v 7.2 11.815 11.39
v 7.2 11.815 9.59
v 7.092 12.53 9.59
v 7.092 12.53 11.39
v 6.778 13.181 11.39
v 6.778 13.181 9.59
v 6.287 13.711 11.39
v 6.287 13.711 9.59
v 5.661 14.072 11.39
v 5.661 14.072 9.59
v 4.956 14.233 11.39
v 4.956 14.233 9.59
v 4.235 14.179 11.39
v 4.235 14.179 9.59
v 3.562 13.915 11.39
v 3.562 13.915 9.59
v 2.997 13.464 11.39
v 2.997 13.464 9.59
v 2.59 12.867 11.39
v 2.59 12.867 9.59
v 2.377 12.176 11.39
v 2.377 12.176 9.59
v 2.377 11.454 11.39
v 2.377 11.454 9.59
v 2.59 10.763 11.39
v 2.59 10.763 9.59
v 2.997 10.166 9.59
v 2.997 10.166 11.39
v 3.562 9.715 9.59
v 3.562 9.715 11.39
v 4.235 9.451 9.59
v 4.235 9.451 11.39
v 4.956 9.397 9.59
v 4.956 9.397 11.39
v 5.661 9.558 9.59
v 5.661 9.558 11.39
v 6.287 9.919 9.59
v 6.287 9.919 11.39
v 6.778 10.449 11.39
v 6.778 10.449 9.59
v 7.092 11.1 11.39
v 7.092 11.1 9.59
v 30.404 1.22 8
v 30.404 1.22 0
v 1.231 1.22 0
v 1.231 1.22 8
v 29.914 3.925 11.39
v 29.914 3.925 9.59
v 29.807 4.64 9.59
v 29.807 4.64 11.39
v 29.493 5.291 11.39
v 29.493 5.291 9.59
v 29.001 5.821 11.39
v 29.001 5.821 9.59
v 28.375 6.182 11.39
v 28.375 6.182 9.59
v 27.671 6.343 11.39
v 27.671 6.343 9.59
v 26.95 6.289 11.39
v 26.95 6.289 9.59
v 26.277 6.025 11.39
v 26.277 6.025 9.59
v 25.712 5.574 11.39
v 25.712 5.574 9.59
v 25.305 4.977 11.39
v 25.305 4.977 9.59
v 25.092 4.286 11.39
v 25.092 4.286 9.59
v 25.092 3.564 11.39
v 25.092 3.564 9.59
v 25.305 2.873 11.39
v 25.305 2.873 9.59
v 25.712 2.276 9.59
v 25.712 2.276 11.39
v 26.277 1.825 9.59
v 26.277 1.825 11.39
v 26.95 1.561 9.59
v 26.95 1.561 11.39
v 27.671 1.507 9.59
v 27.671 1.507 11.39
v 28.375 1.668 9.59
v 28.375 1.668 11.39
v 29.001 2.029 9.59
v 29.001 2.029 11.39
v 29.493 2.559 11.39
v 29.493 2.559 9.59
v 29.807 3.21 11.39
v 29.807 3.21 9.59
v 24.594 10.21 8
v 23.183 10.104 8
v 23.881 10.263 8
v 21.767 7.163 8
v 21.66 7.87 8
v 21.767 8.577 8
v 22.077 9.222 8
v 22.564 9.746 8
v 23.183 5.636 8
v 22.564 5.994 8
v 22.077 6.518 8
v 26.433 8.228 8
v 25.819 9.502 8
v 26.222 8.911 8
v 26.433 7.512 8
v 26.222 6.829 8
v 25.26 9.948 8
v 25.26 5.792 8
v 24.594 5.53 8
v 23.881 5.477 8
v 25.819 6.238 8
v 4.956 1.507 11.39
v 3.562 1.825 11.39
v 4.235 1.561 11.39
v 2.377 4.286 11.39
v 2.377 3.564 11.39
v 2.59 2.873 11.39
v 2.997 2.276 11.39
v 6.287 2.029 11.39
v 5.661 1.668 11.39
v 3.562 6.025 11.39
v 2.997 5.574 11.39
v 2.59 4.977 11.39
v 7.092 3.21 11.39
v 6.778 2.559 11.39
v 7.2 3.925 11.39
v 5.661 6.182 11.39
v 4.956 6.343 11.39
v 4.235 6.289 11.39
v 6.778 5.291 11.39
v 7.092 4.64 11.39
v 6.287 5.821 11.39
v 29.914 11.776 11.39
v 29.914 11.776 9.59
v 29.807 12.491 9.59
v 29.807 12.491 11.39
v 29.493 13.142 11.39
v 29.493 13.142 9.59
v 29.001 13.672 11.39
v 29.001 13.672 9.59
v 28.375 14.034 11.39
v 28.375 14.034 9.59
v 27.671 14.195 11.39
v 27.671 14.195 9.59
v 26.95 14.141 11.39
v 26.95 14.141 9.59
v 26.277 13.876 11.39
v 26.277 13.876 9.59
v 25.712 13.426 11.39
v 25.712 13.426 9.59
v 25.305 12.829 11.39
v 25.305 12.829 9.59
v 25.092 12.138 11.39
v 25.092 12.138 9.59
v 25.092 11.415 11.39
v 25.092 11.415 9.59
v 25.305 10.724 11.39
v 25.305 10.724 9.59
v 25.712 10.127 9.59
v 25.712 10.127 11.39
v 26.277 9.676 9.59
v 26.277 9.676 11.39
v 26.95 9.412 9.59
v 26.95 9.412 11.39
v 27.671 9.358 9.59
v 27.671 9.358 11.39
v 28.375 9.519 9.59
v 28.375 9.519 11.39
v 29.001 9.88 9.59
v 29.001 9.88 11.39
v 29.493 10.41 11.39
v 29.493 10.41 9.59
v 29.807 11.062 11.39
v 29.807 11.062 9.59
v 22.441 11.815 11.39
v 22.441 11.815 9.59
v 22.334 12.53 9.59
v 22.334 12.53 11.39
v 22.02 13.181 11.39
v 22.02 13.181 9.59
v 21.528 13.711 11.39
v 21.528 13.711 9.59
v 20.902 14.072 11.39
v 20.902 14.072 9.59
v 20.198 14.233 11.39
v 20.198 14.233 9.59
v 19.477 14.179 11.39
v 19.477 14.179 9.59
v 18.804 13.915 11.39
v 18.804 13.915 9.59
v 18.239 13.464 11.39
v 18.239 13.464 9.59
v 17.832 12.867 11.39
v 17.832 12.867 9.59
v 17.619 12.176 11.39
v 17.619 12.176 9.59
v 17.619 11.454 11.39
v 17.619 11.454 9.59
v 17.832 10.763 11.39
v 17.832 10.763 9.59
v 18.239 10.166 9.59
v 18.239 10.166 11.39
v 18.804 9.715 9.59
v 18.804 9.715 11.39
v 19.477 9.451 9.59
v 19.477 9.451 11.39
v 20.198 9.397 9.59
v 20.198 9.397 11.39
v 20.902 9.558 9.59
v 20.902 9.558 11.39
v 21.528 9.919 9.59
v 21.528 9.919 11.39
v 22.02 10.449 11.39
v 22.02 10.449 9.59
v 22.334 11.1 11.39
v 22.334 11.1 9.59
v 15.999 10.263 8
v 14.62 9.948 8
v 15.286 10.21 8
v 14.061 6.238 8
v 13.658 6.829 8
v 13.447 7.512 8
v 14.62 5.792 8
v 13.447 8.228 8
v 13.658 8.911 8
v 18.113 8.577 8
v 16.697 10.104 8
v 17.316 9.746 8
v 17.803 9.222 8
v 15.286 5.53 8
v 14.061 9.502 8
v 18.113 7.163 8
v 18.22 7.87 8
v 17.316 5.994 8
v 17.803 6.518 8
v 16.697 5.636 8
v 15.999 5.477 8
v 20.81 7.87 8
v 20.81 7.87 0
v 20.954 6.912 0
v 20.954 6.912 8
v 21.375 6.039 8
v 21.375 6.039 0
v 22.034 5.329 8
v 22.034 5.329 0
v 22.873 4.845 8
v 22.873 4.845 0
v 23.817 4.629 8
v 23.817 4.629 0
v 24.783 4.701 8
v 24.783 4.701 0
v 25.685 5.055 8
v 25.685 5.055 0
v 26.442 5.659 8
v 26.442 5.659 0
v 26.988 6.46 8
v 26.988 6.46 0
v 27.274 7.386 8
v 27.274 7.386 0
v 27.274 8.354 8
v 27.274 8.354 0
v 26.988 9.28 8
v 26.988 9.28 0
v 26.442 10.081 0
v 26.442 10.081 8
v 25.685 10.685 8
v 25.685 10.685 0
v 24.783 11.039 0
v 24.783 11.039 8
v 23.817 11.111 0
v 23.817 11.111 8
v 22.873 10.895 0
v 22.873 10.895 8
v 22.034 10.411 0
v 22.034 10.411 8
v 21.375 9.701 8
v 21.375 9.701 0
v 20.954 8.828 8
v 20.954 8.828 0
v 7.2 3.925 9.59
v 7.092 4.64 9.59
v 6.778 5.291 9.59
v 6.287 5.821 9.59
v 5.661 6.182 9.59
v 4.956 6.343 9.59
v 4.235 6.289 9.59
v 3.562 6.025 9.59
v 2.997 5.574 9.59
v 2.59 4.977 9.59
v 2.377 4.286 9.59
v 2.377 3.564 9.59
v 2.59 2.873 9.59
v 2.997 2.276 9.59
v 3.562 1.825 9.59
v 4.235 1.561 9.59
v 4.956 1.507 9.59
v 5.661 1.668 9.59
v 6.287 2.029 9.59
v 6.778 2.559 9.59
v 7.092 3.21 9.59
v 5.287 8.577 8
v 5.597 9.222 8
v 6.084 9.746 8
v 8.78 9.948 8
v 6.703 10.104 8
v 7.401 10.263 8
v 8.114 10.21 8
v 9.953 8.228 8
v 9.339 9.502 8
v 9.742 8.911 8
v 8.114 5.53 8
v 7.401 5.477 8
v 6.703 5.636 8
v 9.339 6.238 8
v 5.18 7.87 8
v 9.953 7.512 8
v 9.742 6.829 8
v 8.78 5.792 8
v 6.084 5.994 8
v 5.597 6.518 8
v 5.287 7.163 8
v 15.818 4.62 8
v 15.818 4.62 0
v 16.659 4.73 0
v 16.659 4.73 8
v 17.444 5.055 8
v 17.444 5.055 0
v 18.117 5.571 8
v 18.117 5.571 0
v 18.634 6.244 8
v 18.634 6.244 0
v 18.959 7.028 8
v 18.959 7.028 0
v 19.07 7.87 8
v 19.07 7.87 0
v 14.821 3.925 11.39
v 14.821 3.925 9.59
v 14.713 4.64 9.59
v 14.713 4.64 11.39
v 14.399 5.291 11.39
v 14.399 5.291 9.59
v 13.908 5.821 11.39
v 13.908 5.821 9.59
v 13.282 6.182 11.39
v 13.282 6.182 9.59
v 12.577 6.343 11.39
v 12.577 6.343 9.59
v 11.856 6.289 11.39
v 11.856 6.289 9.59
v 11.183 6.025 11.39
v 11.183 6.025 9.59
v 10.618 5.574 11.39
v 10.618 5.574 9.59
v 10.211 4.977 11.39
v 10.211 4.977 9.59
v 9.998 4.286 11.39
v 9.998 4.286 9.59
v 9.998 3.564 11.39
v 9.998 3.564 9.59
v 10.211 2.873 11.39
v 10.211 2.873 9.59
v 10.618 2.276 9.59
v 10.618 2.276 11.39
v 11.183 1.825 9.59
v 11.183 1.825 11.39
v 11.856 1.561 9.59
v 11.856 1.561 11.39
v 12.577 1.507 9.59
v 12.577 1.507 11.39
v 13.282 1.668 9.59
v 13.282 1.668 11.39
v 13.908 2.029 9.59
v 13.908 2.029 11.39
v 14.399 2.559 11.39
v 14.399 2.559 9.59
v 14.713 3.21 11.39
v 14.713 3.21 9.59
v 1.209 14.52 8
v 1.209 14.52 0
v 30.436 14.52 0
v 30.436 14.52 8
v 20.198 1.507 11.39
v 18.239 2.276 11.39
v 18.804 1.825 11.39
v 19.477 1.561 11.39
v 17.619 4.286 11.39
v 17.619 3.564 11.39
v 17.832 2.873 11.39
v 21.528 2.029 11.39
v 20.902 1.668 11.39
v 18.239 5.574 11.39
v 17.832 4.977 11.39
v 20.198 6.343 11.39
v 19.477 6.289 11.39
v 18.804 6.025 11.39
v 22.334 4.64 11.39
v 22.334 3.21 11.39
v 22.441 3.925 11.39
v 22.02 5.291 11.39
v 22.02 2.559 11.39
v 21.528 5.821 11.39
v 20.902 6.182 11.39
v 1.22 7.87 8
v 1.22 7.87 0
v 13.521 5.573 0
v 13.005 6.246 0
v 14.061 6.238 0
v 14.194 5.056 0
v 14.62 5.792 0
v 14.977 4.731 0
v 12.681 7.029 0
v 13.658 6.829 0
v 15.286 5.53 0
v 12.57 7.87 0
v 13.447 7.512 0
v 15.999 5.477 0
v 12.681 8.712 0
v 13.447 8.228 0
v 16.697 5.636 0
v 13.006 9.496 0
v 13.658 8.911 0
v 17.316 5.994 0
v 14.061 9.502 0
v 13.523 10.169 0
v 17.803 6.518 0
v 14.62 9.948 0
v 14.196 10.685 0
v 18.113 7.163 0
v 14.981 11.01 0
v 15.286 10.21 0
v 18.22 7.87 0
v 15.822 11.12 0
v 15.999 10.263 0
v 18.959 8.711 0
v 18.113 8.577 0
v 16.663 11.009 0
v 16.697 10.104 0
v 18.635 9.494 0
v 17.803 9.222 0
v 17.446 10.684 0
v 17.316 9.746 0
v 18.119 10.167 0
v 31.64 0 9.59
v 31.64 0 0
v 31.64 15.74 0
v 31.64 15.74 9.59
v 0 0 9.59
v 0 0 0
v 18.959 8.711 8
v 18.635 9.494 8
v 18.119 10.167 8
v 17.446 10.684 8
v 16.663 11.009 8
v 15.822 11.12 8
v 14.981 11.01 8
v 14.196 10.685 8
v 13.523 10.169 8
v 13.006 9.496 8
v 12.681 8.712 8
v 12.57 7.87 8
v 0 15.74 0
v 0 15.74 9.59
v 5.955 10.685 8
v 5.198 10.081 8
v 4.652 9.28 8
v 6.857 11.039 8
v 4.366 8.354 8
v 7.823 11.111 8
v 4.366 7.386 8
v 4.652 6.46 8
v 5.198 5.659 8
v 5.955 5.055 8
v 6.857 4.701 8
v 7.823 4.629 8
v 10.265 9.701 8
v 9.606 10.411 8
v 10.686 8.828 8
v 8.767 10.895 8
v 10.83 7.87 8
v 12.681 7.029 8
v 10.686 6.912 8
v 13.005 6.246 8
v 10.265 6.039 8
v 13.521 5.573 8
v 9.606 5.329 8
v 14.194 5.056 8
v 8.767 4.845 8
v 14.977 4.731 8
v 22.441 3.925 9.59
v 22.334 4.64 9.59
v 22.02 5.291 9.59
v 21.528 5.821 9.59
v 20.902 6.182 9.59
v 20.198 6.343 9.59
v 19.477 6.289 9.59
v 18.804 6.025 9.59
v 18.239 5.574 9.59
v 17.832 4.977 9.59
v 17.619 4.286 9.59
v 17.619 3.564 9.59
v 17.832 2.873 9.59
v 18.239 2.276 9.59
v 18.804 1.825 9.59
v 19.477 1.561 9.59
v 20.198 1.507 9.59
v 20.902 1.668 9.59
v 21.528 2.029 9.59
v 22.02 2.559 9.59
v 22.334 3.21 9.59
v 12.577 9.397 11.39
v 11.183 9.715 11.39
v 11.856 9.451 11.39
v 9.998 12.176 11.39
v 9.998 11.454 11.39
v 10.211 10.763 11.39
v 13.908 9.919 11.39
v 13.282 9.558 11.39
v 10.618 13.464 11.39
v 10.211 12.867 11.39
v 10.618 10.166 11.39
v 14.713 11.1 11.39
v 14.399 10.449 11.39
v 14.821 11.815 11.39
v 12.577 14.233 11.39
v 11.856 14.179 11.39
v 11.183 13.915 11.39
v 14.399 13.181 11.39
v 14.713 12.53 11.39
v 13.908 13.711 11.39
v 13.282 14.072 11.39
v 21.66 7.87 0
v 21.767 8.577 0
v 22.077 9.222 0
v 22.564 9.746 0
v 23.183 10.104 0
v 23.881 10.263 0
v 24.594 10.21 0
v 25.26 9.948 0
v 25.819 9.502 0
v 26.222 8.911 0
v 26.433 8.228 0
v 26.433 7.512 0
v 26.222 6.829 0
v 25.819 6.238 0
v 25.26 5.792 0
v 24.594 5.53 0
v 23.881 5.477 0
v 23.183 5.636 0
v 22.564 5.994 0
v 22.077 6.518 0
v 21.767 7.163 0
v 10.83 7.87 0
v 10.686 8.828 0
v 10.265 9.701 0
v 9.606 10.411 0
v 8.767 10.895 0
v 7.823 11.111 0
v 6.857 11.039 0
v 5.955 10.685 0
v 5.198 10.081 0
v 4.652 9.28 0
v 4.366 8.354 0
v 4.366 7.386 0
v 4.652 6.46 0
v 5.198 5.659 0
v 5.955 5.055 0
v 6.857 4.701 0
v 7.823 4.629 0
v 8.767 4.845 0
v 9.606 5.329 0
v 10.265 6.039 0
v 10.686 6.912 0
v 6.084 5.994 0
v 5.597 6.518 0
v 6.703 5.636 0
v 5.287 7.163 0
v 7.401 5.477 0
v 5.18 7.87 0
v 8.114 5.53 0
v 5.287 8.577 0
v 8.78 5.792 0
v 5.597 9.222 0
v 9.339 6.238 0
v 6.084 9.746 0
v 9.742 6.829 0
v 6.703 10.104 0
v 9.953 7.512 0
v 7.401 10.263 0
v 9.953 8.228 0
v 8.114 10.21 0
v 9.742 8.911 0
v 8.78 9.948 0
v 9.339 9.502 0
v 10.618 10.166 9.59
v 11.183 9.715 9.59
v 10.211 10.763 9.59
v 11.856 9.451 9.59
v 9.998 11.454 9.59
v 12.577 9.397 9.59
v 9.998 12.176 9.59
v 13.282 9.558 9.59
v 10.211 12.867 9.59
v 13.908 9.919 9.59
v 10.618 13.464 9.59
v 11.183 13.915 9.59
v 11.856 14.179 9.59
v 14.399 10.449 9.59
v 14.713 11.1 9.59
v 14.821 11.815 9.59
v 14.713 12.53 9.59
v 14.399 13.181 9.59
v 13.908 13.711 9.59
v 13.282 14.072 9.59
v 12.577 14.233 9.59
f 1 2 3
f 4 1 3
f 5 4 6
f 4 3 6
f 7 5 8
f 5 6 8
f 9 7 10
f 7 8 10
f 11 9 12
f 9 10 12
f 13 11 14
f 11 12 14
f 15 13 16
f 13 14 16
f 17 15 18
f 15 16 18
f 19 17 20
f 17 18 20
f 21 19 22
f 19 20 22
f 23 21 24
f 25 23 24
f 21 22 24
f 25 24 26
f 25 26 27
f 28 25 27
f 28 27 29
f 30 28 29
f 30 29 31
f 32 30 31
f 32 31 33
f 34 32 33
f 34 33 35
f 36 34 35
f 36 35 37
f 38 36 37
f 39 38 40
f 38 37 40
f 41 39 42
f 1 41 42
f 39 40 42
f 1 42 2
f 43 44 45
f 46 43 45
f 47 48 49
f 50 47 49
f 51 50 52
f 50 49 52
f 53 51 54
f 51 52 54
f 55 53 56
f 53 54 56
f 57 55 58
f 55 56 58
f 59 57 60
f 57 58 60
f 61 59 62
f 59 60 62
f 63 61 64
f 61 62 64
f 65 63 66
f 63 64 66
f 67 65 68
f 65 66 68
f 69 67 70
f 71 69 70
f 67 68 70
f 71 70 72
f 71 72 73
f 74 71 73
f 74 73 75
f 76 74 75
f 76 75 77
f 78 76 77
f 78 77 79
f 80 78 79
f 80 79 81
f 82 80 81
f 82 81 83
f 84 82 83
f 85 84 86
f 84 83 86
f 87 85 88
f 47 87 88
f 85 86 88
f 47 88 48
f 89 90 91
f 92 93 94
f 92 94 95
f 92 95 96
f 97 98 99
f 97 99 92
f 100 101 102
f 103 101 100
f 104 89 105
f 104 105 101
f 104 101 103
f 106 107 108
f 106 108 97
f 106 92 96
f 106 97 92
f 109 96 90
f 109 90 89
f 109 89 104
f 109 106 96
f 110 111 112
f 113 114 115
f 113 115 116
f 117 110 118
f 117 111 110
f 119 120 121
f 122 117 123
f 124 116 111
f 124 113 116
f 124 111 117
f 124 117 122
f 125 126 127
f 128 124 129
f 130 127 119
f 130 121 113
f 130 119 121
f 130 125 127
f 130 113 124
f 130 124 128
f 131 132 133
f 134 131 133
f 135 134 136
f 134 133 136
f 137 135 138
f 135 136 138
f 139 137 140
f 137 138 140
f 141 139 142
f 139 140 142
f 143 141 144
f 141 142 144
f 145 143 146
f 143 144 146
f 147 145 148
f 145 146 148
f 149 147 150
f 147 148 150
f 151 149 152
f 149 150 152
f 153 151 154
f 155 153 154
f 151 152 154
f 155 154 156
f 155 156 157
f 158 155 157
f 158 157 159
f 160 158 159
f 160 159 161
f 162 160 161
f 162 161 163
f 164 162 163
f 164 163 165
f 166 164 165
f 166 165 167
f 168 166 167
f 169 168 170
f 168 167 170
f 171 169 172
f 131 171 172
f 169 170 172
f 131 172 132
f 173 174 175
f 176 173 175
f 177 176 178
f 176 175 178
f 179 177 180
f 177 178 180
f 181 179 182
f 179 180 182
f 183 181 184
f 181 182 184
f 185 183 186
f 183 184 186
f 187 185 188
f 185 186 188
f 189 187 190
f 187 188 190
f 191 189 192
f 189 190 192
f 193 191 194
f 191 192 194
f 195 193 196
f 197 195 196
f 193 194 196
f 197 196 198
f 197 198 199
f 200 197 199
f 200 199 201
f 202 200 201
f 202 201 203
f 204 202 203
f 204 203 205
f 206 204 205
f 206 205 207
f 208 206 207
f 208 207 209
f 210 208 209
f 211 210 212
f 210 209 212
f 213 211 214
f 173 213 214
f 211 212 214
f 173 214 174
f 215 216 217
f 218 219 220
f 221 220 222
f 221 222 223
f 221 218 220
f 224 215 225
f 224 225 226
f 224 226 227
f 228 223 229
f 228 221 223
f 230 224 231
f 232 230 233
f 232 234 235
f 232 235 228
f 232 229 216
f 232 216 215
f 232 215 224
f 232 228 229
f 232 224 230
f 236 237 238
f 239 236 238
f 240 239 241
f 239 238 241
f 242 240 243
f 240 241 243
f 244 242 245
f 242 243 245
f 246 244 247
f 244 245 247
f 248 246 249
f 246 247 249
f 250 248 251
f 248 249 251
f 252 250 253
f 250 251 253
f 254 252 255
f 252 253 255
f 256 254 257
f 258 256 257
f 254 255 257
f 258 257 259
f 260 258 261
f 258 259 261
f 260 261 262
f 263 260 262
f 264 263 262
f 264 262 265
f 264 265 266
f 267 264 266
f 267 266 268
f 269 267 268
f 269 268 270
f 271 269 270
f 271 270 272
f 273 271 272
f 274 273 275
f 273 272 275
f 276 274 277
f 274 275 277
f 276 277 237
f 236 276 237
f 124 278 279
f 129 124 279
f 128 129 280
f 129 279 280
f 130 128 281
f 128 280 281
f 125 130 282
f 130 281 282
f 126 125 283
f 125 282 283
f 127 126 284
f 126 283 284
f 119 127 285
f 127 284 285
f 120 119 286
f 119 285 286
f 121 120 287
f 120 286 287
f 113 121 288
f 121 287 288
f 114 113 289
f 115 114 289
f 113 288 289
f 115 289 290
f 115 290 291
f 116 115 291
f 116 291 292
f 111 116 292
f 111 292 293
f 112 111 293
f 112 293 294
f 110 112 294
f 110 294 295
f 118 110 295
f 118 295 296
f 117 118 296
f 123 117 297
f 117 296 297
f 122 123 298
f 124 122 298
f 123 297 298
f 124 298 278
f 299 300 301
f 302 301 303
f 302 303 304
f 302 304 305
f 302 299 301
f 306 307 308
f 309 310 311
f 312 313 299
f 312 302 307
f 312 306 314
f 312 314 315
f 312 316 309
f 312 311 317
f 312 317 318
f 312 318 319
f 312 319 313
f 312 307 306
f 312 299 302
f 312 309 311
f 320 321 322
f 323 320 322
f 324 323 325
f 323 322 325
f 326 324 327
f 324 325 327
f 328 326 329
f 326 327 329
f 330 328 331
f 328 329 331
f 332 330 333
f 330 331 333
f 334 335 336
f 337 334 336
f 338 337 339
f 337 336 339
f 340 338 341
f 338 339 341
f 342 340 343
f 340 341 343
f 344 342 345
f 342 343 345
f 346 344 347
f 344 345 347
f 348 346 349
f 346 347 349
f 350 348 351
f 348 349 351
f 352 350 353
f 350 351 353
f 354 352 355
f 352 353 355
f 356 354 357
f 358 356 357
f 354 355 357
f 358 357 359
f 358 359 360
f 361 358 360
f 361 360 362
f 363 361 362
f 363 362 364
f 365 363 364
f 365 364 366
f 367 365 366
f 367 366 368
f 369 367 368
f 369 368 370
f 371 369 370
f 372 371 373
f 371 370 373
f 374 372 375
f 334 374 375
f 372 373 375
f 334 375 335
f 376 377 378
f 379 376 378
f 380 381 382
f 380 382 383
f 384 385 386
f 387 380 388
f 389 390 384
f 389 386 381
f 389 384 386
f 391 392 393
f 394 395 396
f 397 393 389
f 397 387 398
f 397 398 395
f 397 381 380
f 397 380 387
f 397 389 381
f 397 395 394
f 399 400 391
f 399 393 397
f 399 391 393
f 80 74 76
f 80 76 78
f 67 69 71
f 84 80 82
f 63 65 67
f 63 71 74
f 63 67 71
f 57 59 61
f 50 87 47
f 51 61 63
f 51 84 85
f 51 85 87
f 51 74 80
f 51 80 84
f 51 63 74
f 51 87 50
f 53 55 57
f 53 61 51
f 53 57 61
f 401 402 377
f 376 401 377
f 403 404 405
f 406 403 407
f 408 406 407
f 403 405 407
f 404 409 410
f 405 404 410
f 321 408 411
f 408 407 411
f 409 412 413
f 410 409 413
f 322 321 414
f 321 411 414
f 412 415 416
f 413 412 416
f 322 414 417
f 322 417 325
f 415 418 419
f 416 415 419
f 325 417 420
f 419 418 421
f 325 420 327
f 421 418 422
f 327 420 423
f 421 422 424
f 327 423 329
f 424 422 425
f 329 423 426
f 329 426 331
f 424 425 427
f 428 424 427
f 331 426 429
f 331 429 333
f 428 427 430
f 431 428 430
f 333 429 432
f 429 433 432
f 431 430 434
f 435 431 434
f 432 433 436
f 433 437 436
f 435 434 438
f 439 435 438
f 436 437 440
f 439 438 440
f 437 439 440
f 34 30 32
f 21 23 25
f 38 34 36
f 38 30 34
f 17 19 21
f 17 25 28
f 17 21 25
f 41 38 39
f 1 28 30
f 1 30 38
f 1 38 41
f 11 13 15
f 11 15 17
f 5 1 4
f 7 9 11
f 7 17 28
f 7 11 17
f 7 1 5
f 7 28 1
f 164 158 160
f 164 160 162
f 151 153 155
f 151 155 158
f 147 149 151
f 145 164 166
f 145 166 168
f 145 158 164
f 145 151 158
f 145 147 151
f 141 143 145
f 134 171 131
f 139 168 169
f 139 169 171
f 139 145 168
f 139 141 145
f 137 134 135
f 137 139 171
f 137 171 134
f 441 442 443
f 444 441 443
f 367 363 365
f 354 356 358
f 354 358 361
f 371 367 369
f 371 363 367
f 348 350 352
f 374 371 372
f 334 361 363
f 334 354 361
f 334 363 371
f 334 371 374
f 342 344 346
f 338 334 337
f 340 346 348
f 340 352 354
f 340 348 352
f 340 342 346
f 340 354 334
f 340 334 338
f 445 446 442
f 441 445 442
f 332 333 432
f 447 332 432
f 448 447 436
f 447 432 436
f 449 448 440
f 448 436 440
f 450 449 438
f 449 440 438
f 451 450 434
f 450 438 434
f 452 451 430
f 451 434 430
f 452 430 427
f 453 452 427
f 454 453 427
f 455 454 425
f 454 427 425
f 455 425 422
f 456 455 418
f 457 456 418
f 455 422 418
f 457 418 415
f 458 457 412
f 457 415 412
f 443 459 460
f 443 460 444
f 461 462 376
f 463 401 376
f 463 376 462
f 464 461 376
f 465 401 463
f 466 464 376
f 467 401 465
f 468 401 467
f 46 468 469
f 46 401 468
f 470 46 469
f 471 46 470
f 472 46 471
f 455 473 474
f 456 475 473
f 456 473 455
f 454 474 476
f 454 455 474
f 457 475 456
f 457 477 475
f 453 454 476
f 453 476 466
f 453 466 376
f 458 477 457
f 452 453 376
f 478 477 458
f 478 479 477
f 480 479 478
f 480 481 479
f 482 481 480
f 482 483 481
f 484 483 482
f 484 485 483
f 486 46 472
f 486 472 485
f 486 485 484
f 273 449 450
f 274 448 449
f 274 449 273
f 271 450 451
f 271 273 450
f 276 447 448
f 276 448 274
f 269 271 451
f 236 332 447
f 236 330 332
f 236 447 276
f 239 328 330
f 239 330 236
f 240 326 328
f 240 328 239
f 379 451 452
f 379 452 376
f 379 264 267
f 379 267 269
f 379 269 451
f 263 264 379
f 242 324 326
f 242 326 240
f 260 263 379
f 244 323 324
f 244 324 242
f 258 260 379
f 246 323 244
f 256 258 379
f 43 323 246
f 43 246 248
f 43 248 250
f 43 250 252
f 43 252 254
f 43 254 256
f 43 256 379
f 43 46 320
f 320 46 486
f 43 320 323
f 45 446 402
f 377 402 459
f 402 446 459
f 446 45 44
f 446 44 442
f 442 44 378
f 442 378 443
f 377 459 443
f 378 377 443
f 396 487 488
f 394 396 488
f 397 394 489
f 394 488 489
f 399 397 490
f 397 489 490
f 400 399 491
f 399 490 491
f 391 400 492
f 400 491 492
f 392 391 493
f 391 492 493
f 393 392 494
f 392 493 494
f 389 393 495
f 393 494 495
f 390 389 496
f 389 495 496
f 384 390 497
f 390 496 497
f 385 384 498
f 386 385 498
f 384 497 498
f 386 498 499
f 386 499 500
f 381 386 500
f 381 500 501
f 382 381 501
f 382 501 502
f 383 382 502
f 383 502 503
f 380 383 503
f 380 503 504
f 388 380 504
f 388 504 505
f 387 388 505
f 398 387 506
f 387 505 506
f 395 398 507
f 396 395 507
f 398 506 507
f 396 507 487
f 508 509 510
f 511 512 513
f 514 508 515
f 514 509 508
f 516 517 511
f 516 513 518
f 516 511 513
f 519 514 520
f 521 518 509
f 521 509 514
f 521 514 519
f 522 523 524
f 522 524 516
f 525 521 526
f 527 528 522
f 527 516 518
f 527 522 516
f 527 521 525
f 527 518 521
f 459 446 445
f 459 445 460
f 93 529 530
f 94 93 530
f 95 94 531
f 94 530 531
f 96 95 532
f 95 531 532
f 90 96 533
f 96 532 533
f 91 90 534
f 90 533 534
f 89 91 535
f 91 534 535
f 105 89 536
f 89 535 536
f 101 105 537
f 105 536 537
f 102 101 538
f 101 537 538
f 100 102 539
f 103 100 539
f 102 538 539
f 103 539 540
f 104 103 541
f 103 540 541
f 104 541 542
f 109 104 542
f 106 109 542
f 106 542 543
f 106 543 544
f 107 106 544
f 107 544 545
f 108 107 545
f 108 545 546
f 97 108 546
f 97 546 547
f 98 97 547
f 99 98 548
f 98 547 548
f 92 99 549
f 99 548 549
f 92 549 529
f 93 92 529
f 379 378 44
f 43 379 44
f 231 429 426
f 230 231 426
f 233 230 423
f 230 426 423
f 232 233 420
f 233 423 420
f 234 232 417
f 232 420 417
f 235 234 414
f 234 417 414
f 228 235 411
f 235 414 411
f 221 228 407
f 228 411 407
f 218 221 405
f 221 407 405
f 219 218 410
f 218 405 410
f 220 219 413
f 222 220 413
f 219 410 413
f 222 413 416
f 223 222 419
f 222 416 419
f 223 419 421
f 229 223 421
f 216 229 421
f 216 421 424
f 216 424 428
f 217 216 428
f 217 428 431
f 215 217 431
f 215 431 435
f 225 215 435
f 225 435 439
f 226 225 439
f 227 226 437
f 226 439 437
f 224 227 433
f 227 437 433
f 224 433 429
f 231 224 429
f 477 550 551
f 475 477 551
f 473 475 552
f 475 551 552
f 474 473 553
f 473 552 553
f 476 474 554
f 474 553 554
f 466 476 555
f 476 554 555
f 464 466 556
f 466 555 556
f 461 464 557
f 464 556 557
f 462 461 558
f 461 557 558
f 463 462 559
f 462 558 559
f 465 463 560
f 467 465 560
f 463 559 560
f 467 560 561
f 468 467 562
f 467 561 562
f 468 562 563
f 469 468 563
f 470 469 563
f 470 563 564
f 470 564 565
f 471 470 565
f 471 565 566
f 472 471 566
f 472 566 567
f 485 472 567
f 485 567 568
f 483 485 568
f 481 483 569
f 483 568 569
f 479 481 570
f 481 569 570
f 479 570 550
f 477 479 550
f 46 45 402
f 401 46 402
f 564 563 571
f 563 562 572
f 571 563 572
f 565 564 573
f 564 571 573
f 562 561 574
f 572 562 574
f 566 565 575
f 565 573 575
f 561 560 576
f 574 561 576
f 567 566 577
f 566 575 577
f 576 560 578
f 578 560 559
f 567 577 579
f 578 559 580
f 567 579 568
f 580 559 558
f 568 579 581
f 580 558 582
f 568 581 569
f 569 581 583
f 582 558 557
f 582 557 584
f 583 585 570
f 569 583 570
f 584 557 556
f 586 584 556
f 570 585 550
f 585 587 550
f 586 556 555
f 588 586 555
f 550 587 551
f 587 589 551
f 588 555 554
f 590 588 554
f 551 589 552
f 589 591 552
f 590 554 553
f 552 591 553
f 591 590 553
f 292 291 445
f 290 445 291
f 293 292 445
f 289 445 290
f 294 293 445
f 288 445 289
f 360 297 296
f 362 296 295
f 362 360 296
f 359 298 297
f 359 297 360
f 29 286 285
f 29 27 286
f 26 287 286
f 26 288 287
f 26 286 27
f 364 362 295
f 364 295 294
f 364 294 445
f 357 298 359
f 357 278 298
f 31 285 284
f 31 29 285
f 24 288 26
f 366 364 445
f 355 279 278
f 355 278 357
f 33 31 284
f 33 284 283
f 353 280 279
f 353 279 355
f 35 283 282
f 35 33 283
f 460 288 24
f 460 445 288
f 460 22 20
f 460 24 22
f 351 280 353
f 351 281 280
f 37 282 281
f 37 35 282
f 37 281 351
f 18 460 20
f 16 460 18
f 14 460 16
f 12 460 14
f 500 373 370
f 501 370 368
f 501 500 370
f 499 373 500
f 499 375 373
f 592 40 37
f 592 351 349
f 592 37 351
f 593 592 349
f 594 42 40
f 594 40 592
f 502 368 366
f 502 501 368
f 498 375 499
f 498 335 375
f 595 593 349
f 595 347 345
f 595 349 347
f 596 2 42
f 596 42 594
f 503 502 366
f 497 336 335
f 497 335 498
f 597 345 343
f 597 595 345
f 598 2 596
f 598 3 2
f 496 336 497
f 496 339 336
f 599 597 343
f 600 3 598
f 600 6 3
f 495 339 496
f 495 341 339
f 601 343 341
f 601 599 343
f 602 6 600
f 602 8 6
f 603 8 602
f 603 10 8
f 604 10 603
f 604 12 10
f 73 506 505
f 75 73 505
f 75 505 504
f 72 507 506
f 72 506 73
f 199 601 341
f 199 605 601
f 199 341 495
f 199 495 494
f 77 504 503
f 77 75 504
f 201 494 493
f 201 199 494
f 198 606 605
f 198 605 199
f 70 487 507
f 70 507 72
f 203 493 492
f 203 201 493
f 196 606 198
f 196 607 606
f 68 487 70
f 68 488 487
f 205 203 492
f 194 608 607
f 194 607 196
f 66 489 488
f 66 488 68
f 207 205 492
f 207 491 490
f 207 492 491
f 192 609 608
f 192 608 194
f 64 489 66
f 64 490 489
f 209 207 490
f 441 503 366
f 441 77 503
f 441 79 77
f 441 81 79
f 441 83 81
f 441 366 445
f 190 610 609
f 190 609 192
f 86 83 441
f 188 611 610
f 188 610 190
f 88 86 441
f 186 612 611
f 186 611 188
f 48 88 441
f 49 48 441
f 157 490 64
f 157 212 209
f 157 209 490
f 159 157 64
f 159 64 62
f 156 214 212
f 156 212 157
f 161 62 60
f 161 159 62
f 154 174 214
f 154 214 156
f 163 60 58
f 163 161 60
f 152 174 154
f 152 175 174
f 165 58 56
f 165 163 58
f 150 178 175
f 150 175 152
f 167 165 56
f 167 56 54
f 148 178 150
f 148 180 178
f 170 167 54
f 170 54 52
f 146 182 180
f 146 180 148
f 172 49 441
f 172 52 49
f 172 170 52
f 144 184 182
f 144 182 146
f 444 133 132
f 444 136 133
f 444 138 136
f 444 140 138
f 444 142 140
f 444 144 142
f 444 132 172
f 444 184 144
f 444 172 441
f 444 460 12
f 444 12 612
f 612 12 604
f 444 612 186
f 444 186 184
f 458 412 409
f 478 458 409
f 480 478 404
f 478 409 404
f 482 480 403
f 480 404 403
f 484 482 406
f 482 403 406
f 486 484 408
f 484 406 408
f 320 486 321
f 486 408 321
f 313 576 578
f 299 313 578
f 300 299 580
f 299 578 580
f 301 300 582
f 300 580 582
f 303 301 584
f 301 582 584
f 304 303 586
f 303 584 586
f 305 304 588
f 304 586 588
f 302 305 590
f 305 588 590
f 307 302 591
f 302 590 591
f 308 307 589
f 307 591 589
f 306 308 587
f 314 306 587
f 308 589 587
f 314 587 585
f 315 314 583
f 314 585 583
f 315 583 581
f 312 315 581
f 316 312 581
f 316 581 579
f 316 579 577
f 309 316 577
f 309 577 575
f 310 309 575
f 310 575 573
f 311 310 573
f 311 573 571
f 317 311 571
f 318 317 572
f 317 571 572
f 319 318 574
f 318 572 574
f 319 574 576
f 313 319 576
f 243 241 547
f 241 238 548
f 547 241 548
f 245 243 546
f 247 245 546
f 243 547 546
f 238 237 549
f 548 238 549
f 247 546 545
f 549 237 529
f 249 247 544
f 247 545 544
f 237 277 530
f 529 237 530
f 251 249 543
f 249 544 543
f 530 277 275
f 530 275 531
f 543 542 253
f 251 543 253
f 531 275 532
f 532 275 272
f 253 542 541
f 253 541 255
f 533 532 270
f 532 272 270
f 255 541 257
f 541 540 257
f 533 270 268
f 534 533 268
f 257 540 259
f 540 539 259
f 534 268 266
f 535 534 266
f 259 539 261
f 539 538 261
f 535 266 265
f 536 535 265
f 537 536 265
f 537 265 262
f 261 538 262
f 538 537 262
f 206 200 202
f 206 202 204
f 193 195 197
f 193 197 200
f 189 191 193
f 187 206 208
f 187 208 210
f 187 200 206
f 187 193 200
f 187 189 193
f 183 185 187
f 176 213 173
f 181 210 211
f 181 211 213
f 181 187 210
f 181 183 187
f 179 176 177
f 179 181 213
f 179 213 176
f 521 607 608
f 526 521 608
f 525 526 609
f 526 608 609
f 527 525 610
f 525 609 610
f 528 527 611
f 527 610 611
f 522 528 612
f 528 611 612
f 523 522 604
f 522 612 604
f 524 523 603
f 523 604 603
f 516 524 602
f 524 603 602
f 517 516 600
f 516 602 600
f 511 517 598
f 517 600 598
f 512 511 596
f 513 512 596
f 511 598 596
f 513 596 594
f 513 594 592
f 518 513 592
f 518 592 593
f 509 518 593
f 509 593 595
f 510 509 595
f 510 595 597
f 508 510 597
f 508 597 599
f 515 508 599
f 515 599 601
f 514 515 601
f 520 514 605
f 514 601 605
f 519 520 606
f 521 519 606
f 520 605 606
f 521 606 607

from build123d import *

# Parameters (mm, degrees)
F0_W     = 31.64
F0_H     = 15.74
F1_DEPTH = 9.59
F2_R     = 2.425
F3_DEPTH = 1.8
F5_DEPTH = 8


with BuildPart() as f1:
    # F0 (on Top) → F1 (new body)
    with BuildSketch(Plane.XY):
        with Locations((15.82, 7.87)):
            Rectangle(F0_W, F0_H)
    extrude(amount=F1_DEPTH)

    # F2 (on face) → F3 (join)
    with BuildSketch(Plane.XY.offset(9.59)):
        with Locations((4.7746349379, 11.815)):
            Circle(F2_R)
        with Locations((12.3955499551, 11.815)):
            Circle(F2_R)
        with Locations((20.0164649723, 11.815)):
            Circle(F2_R)
        with Locations((27.4894218309, 11.7763556091)):
            Circle(F2_R)
        with Locations((4.7746349379, 3.925)):
            Circle(F2_R)
        with Locations((12.3955499551, 3.925)):
            Circle(F2_R)
        with Locations((20.0164649723, 3.925)):
            Circle(F2_R)
        with Locations((27.4894218309, 3.925)):
            Circle(F2_R)
    extrude(amount=F3_DEPTH)

    # F4 (on face) → F5 (cut)
    with BuildSketch(Plane(origin=(0, 0, 0), x_dir=(1, 0, 0), z_dir=(0, 0, -1))):
        with BuildLine():
            ThreePointArc((19.07, -7.87), (18.1189275762, -10.1672662012), (15.8223495388, -11.1199991507))
            Line((15.8223495388, -11.1199991507), (15.8223495388, -14.52))
            Line((15.8223495388, -14.52), (30.4358961851, -14.52))
            Line((30.4358961851, -14.52), (30.4199965129, -7.87))
            Line((30.4199965129, -7.87), (27.31, -7.87))
            ThreePointArc((27.31, -7.87), (24.06, -11.12), (20.81, -7.87))
            Line((20.81, -7.87), (19.07, -7.87))
        make_face()
        with BuildLine():
            Line((15.817648704, -1.22), (15.817648704, -4.6200008506))
            ThreePointArc((15.817648704, -4.6200008506), (18.1172655798, -5.5710718028), (19.07, -7.87))
            Line((19.07, -7.87), (20.81, -7.87))
            ThreePointArc((20.81, -7.87), (24.06, -4.62), (27.31, -7.87))
            Line((27.31, -7.87), (30.4199965129, -7.87))
            Line((30.4199965129, -7.87), (30.4040968407, -1.22))
            Line((30.4040968407, -1.22), (15.817648704, -1.22))
        make_face()
        with BuildLine():
            ThreePointArc((4.33, -7.87), (7.58, -4.62), (10.83, -7.87))
            Line((10.83, -7.87), (12.57, -7.87))
            ThreePointArc((12.57, -7.87), (13.5210718028, -5.5727344202), (15.817648704, -4.6200008506))
            Line((15.817648704, -4.6200008506), (15.817648704, -1.22))
            Line((15.817648704, -1.22), (1.2312005673, -1.22))
            Line((1.2312005673, -1.22), (1.2200017299, -7.87))
            Line((1.2200017299, -7.87), (4.33, -7.87))
        make_face()
        with BuildLine():
            Line((12.57, -7.87), (10.83, -7.87))
            ThreePointArc((10.83, -7.87), (7.58, -11.12), (4.33, -7.87))
            Line((4.33, -7.87), (1.2200017299, -7.87))
            Line((1.2200017299, -7.87), (1.2088028926, -14.52))
            Line((1.2088028926, -14.52), (15.8223495388, -14.52))
            Line((15.8223495388, -14.52), (15.8223495388, -11.1199991507))
            ThreePointArc((15.8223495388, -11.1199991507), (13.5227337988, -10.1689275762), (12.57, -7.87))
        make_face()
        with BuildLine():
            Line((5.18, -7.87), (9.98, -7.87))
            ThreePointArc((9.98, -7.87), (7.58, -5.47), (5.18, -7.87))
        make_face()
        with BuildLine():
            ThreePointArc((5.18, -7.87), (7.58, -10.27), (9.98, -7.87))
            Line((9.98, -7.87), (5.18, -7.87))
        make_face()
        with BuildLine():
            Line((18.22, -7.87), (13.42, -7.87))
            ThreePointArc((13.42, -7.87), (15.82, -10.27), (18.22, -7.87))
        make_face()
        with BuildLine():
            ThreePointArc((18.22, -7.87), (15.82, -5.47), (13.42, -7.87))
            Line((13.42, -7.87), (18.22, -7.87))
        make_face()
        with BuildLine():
            ThreePointArc((26.46, -7.87), (24.06, -5.47), (21.66, -7.87))
            Line((21.66, -7.87), (26.46, -7.87))
        make_face()
        with BuildLine():
            Line((26.46, -7.87), (21.66, -7.87))
            ThreePointArc((21.66, -7.87), (24.06, -10.27), (26.46, -7.87))
        make_face()
    extrude(amount=-F5_DEPTH, mode=Mode.SUBTRACT)


solid = f1.part
